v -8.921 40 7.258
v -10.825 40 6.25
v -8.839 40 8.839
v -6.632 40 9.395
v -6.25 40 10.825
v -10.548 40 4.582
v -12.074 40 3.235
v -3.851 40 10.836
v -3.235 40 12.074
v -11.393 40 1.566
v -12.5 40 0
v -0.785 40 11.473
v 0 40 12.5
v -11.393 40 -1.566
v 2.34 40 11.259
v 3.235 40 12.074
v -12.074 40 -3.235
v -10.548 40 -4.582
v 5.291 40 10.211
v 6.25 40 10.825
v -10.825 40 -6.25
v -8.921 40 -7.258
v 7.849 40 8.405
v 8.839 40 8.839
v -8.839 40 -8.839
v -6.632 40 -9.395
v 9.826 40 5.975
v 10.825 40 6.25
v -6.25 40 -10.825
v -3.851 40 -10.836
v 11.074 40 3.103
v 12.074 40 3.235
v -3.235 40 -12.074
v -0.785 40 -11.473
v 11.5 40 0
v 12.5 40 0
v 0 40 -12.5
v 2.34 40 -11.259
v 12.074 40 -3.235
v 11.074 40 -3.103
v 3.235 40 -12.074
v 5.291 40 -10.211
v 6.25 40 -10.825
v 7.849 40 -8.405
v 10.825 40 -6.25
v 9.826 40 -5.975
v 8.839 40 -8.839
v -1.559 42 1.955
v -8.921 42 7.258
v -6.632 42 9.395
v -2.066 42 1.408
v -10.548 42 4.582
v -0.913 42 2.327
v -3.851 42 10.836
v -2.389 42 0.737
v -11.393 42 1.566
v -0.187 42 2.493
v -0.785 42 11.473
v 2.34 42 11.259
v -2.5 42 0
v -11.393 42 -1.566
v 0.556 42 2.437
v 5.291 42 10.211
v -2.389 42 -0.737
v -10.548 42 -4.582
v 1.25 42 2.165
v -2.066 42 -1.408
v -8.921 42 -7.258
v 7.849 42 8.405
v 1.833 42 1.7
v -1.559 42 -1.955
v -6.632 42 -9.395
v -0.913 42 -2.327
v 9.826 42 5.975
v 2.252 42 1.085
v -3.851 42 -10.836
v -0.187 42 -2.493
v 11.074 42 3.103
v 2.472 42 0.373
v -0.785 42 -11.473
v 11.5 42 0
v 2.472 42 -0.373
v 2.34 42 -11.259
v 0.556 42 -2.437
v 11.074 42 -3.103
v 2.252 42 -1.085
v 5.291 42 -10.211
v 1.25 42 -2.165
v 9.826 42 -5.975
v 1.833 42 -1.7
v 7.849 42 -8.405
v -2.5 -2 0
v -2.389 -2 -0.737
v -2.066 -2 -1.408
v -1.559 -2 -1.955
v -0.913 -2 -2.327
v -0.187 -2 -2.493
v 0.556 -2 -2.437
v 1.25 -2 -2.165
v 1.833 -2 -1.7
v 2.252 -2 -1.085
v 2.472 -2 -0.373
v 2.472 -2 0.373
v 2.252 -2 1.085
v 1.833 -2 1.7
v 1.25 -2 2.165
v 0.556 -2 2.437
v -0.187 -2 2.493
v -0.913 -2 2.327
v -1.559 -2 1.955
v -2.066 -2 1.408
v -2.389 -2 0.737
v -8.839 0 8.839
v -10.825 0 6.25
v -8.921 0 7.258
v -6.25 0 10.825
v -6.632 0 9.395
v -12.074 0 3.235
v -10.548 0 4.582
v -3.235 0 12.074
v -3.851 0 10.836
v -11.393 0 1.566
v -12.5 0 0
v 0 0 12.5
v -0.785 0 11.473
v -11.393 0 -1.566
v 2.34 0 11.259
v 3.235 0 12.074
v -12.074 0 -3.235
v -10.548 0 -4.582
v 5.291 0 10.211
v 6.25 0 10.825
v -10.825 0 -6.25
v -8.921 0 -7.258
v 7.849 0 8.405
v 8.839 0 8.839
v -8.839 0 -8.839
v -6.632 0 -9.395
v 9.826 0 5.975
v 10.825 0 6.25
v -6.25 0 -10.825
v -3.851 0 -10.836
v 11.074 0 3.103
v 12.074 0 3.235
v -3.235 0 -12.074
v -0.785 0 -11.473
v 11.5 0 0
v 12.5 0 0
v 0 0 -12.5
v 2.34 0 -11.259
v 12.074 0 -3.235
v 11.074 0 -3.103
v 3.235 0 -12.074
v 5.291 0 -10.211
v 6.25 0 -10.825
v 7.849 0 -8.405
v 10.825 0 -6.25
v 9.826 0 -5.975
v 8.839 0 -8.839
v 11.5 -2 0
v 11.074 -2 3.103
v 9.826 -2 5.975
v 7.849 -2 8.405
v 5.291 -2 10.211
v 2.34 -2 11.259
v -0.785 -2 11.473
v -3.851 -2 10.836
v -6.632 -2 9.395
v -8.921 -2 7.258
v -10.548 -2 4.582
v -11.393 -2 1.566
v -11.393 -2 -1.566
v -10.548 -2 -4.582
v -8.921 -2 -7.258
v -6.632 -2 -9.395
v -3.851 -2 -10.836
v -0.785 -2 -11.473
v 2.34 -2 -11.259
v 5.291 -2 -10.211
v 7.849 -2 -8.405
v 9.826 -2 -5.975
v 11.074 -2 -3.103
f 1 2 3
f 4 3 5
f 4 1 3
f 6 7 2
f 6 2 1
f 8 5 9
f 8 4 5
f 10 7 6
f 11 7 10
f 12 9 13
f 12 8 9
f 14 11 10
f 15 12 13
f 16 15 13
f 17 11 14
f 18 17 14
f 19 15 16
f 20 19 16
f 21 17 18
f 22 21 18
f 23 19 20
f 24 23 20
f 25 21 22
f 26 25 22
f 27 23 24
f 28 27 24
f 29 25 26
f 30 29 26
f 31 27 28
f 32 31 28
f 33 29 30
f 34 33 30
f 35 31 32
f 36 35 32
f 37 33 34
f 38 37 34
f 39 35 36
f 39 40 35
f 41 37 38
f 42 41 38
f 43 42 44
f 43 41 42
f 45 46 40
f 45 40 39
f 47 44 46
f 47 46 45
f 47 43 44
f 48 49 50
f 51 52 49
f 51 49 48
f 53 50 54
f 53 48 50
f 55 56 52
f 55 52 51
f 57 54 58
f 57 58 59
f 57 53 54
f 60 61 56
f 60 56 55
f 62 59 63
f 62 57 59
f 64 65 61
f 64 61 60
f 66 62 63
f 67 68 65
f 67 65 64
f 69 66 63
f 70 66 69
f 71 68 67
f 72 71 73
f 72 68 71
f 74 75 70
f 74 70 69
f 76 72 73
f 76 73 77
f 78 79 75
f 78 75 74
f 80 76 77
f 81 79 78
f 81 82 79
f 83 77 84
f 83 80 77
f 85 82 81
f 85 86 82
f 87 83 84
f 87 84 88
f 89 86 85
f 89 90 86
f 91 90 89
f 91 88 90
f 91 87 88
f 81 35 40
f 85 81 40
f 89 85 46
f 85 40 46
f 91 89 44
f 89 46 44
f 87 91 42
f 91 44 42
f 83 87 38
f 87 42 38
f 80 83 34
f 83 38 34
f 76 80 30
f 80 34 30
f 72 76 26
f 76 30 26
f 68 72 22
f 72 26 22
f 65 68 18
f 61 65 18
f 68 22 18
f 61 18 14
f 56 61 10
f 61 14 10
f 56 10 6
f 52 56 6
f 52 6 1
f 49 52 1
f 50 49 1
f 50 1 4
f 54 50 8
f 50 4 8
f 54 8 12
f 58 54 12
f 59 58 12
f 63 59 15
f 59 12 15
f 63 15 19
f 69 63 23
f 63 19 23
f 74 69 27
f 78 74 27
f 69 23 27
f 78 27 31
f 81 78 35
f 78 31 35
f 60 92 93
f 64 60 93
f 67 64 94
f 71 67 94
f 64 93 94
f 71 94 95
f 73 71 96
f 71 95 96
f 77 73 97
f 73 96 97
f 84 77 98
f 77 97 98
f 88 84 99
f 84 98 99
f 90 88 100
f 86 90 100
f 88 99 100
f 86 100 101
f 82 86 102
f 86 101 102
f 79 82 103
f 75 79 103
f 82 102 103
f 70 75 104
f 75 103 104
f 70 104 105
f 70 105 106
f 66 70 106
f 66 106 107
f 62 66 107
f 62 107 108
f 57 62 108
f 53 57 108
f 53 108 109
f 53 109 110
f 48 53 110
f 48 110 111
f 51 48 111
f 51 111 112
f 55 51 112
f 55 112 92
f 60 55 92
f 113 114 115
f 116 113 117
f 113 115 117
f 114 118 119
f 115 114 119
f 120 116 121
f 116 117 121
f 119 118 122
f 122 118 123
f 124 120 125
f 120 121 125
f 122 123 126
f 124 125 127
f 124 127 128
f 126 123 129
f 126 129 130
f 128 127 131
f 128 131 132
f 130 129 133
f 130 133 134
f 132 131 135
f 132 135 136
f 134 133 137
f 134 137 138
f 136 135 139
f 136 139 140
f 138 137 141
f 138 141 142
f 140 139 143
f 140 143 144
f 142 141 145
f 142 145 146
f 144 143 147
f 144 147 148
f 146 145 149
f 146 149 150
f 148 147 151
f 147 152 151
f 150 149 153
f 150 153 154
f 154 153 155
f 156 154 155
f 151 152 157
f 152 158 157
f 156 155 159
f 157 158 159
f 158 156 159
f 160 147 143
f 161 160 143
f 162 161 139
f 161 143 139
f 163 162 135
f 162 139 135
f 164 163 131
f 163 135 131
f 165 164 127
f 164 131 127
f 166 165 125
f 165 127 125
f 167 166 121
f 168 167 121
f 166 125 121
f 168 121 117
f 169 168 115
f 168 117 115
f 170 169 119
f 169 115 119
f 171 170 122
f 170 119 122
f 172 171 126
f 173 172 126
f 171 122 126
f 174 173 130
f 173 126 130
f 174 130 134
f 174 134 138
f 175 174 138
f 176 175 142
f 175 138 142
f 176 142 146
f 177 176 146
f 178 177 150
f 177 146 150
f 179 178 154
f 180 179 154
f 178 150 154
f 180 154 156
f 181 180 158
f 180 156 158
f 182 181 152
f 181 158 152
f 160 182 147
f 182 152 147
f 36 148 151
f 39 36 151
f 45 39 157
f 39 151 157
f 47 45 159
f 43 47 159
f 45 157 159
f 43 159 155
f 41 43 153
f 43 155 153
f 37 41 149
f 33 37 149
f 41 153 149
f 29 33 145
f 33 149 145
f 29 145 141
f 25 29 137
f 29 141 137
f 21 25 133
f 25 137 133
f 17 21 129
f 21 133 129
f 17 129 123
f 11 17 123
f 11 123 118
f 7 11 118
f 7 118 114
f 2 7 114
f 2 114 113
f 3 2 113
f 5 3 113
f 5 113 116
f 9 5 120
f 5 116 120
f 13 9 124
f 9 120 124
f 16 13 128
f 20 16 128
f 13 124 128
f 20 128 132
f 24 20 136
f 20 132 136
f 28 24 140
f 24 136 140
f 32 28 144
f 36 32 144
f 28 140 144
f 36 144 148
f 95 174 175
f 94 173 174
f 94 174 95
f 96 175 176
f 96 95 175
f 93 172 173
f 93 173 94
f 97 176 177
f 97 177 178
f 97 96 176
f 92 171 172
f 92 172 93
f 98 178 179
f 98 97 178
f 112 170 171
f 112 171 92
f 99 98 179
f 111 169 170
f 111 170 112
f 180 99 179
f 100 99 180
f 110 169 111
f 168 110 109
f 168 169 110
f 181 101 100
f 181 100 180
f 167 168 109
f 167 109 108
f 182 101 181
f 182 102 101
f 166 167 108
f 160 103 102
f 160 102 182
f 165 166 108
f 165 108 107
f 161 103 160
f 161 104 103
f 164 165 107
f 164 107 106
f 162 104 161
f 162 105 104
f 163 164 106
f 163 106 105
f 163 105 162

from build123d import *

# Parameters (mm, degrees)
SKETCH1_R               = 12.5
BOSS_EXTRUDE1_DEPTH     = 40
SKETCH2_R               = 11.5
BOSS_EXTRUDE2_DEPTH     = 2
SKETCH3_R               = 11.5
BOSS_EXTRUDE3_DEPTH     = 2
SKETCH4_R               = 2.5
CUT_EXTRUDE1_DEPTH      = 1
CUT_EXTRUDE1_DEPTH_BACK = 45


with BuildPart() as part:
    # Sketch1 → Boss-Extrude1 (new body)
    with BuildSketch(Plane(origin=(0, 0, 0), x_dir=(1, 0, 0), z_dir=(0, 1, 0))):
        Circle(SKETCH1_R)
    extrude(amount=BOSS_EXTRUDE1_DEPTH)

    # Sketch2 → Boss-Extrude2 (add)
    with BuildSketch(Plane(origin=(0, 40, 0), x_dir=(1, 0, 0), z_dir=(0, 1, 0))):
        Circle(SKETCH2_R)
    extrude(amount=BOSS_EXTRUDE2_DEPTH)

    # Sketch3 → Boss-Extrude3 (add)
    with BuildSketch(Plane.XZ):
        Circle(SKETCH3_R)
    extrude(amount=BOSS_EXTRUDE3_DEPTH)

    # Sketch4 → Cut-Extrude1 (cut, two sides)
    with BuildSketch(Plane(origin=(0, -2, 0), x_dir=(-1, 0, 0), z_dir=(0, -1, 0))) as cut_extrude1_sk:
        Circle(SKETCH4_R)
    extrude(amount=CUT_EXTRUDE1_DEPTH, mode=Mode.SUBTRACT)
    extrude(cut_extrude1_sk.sketch, amount=-CUT_EXTRUDE1_DEPTH_BACK, mode=Mode.SUBTRACT)


solid = part.part
